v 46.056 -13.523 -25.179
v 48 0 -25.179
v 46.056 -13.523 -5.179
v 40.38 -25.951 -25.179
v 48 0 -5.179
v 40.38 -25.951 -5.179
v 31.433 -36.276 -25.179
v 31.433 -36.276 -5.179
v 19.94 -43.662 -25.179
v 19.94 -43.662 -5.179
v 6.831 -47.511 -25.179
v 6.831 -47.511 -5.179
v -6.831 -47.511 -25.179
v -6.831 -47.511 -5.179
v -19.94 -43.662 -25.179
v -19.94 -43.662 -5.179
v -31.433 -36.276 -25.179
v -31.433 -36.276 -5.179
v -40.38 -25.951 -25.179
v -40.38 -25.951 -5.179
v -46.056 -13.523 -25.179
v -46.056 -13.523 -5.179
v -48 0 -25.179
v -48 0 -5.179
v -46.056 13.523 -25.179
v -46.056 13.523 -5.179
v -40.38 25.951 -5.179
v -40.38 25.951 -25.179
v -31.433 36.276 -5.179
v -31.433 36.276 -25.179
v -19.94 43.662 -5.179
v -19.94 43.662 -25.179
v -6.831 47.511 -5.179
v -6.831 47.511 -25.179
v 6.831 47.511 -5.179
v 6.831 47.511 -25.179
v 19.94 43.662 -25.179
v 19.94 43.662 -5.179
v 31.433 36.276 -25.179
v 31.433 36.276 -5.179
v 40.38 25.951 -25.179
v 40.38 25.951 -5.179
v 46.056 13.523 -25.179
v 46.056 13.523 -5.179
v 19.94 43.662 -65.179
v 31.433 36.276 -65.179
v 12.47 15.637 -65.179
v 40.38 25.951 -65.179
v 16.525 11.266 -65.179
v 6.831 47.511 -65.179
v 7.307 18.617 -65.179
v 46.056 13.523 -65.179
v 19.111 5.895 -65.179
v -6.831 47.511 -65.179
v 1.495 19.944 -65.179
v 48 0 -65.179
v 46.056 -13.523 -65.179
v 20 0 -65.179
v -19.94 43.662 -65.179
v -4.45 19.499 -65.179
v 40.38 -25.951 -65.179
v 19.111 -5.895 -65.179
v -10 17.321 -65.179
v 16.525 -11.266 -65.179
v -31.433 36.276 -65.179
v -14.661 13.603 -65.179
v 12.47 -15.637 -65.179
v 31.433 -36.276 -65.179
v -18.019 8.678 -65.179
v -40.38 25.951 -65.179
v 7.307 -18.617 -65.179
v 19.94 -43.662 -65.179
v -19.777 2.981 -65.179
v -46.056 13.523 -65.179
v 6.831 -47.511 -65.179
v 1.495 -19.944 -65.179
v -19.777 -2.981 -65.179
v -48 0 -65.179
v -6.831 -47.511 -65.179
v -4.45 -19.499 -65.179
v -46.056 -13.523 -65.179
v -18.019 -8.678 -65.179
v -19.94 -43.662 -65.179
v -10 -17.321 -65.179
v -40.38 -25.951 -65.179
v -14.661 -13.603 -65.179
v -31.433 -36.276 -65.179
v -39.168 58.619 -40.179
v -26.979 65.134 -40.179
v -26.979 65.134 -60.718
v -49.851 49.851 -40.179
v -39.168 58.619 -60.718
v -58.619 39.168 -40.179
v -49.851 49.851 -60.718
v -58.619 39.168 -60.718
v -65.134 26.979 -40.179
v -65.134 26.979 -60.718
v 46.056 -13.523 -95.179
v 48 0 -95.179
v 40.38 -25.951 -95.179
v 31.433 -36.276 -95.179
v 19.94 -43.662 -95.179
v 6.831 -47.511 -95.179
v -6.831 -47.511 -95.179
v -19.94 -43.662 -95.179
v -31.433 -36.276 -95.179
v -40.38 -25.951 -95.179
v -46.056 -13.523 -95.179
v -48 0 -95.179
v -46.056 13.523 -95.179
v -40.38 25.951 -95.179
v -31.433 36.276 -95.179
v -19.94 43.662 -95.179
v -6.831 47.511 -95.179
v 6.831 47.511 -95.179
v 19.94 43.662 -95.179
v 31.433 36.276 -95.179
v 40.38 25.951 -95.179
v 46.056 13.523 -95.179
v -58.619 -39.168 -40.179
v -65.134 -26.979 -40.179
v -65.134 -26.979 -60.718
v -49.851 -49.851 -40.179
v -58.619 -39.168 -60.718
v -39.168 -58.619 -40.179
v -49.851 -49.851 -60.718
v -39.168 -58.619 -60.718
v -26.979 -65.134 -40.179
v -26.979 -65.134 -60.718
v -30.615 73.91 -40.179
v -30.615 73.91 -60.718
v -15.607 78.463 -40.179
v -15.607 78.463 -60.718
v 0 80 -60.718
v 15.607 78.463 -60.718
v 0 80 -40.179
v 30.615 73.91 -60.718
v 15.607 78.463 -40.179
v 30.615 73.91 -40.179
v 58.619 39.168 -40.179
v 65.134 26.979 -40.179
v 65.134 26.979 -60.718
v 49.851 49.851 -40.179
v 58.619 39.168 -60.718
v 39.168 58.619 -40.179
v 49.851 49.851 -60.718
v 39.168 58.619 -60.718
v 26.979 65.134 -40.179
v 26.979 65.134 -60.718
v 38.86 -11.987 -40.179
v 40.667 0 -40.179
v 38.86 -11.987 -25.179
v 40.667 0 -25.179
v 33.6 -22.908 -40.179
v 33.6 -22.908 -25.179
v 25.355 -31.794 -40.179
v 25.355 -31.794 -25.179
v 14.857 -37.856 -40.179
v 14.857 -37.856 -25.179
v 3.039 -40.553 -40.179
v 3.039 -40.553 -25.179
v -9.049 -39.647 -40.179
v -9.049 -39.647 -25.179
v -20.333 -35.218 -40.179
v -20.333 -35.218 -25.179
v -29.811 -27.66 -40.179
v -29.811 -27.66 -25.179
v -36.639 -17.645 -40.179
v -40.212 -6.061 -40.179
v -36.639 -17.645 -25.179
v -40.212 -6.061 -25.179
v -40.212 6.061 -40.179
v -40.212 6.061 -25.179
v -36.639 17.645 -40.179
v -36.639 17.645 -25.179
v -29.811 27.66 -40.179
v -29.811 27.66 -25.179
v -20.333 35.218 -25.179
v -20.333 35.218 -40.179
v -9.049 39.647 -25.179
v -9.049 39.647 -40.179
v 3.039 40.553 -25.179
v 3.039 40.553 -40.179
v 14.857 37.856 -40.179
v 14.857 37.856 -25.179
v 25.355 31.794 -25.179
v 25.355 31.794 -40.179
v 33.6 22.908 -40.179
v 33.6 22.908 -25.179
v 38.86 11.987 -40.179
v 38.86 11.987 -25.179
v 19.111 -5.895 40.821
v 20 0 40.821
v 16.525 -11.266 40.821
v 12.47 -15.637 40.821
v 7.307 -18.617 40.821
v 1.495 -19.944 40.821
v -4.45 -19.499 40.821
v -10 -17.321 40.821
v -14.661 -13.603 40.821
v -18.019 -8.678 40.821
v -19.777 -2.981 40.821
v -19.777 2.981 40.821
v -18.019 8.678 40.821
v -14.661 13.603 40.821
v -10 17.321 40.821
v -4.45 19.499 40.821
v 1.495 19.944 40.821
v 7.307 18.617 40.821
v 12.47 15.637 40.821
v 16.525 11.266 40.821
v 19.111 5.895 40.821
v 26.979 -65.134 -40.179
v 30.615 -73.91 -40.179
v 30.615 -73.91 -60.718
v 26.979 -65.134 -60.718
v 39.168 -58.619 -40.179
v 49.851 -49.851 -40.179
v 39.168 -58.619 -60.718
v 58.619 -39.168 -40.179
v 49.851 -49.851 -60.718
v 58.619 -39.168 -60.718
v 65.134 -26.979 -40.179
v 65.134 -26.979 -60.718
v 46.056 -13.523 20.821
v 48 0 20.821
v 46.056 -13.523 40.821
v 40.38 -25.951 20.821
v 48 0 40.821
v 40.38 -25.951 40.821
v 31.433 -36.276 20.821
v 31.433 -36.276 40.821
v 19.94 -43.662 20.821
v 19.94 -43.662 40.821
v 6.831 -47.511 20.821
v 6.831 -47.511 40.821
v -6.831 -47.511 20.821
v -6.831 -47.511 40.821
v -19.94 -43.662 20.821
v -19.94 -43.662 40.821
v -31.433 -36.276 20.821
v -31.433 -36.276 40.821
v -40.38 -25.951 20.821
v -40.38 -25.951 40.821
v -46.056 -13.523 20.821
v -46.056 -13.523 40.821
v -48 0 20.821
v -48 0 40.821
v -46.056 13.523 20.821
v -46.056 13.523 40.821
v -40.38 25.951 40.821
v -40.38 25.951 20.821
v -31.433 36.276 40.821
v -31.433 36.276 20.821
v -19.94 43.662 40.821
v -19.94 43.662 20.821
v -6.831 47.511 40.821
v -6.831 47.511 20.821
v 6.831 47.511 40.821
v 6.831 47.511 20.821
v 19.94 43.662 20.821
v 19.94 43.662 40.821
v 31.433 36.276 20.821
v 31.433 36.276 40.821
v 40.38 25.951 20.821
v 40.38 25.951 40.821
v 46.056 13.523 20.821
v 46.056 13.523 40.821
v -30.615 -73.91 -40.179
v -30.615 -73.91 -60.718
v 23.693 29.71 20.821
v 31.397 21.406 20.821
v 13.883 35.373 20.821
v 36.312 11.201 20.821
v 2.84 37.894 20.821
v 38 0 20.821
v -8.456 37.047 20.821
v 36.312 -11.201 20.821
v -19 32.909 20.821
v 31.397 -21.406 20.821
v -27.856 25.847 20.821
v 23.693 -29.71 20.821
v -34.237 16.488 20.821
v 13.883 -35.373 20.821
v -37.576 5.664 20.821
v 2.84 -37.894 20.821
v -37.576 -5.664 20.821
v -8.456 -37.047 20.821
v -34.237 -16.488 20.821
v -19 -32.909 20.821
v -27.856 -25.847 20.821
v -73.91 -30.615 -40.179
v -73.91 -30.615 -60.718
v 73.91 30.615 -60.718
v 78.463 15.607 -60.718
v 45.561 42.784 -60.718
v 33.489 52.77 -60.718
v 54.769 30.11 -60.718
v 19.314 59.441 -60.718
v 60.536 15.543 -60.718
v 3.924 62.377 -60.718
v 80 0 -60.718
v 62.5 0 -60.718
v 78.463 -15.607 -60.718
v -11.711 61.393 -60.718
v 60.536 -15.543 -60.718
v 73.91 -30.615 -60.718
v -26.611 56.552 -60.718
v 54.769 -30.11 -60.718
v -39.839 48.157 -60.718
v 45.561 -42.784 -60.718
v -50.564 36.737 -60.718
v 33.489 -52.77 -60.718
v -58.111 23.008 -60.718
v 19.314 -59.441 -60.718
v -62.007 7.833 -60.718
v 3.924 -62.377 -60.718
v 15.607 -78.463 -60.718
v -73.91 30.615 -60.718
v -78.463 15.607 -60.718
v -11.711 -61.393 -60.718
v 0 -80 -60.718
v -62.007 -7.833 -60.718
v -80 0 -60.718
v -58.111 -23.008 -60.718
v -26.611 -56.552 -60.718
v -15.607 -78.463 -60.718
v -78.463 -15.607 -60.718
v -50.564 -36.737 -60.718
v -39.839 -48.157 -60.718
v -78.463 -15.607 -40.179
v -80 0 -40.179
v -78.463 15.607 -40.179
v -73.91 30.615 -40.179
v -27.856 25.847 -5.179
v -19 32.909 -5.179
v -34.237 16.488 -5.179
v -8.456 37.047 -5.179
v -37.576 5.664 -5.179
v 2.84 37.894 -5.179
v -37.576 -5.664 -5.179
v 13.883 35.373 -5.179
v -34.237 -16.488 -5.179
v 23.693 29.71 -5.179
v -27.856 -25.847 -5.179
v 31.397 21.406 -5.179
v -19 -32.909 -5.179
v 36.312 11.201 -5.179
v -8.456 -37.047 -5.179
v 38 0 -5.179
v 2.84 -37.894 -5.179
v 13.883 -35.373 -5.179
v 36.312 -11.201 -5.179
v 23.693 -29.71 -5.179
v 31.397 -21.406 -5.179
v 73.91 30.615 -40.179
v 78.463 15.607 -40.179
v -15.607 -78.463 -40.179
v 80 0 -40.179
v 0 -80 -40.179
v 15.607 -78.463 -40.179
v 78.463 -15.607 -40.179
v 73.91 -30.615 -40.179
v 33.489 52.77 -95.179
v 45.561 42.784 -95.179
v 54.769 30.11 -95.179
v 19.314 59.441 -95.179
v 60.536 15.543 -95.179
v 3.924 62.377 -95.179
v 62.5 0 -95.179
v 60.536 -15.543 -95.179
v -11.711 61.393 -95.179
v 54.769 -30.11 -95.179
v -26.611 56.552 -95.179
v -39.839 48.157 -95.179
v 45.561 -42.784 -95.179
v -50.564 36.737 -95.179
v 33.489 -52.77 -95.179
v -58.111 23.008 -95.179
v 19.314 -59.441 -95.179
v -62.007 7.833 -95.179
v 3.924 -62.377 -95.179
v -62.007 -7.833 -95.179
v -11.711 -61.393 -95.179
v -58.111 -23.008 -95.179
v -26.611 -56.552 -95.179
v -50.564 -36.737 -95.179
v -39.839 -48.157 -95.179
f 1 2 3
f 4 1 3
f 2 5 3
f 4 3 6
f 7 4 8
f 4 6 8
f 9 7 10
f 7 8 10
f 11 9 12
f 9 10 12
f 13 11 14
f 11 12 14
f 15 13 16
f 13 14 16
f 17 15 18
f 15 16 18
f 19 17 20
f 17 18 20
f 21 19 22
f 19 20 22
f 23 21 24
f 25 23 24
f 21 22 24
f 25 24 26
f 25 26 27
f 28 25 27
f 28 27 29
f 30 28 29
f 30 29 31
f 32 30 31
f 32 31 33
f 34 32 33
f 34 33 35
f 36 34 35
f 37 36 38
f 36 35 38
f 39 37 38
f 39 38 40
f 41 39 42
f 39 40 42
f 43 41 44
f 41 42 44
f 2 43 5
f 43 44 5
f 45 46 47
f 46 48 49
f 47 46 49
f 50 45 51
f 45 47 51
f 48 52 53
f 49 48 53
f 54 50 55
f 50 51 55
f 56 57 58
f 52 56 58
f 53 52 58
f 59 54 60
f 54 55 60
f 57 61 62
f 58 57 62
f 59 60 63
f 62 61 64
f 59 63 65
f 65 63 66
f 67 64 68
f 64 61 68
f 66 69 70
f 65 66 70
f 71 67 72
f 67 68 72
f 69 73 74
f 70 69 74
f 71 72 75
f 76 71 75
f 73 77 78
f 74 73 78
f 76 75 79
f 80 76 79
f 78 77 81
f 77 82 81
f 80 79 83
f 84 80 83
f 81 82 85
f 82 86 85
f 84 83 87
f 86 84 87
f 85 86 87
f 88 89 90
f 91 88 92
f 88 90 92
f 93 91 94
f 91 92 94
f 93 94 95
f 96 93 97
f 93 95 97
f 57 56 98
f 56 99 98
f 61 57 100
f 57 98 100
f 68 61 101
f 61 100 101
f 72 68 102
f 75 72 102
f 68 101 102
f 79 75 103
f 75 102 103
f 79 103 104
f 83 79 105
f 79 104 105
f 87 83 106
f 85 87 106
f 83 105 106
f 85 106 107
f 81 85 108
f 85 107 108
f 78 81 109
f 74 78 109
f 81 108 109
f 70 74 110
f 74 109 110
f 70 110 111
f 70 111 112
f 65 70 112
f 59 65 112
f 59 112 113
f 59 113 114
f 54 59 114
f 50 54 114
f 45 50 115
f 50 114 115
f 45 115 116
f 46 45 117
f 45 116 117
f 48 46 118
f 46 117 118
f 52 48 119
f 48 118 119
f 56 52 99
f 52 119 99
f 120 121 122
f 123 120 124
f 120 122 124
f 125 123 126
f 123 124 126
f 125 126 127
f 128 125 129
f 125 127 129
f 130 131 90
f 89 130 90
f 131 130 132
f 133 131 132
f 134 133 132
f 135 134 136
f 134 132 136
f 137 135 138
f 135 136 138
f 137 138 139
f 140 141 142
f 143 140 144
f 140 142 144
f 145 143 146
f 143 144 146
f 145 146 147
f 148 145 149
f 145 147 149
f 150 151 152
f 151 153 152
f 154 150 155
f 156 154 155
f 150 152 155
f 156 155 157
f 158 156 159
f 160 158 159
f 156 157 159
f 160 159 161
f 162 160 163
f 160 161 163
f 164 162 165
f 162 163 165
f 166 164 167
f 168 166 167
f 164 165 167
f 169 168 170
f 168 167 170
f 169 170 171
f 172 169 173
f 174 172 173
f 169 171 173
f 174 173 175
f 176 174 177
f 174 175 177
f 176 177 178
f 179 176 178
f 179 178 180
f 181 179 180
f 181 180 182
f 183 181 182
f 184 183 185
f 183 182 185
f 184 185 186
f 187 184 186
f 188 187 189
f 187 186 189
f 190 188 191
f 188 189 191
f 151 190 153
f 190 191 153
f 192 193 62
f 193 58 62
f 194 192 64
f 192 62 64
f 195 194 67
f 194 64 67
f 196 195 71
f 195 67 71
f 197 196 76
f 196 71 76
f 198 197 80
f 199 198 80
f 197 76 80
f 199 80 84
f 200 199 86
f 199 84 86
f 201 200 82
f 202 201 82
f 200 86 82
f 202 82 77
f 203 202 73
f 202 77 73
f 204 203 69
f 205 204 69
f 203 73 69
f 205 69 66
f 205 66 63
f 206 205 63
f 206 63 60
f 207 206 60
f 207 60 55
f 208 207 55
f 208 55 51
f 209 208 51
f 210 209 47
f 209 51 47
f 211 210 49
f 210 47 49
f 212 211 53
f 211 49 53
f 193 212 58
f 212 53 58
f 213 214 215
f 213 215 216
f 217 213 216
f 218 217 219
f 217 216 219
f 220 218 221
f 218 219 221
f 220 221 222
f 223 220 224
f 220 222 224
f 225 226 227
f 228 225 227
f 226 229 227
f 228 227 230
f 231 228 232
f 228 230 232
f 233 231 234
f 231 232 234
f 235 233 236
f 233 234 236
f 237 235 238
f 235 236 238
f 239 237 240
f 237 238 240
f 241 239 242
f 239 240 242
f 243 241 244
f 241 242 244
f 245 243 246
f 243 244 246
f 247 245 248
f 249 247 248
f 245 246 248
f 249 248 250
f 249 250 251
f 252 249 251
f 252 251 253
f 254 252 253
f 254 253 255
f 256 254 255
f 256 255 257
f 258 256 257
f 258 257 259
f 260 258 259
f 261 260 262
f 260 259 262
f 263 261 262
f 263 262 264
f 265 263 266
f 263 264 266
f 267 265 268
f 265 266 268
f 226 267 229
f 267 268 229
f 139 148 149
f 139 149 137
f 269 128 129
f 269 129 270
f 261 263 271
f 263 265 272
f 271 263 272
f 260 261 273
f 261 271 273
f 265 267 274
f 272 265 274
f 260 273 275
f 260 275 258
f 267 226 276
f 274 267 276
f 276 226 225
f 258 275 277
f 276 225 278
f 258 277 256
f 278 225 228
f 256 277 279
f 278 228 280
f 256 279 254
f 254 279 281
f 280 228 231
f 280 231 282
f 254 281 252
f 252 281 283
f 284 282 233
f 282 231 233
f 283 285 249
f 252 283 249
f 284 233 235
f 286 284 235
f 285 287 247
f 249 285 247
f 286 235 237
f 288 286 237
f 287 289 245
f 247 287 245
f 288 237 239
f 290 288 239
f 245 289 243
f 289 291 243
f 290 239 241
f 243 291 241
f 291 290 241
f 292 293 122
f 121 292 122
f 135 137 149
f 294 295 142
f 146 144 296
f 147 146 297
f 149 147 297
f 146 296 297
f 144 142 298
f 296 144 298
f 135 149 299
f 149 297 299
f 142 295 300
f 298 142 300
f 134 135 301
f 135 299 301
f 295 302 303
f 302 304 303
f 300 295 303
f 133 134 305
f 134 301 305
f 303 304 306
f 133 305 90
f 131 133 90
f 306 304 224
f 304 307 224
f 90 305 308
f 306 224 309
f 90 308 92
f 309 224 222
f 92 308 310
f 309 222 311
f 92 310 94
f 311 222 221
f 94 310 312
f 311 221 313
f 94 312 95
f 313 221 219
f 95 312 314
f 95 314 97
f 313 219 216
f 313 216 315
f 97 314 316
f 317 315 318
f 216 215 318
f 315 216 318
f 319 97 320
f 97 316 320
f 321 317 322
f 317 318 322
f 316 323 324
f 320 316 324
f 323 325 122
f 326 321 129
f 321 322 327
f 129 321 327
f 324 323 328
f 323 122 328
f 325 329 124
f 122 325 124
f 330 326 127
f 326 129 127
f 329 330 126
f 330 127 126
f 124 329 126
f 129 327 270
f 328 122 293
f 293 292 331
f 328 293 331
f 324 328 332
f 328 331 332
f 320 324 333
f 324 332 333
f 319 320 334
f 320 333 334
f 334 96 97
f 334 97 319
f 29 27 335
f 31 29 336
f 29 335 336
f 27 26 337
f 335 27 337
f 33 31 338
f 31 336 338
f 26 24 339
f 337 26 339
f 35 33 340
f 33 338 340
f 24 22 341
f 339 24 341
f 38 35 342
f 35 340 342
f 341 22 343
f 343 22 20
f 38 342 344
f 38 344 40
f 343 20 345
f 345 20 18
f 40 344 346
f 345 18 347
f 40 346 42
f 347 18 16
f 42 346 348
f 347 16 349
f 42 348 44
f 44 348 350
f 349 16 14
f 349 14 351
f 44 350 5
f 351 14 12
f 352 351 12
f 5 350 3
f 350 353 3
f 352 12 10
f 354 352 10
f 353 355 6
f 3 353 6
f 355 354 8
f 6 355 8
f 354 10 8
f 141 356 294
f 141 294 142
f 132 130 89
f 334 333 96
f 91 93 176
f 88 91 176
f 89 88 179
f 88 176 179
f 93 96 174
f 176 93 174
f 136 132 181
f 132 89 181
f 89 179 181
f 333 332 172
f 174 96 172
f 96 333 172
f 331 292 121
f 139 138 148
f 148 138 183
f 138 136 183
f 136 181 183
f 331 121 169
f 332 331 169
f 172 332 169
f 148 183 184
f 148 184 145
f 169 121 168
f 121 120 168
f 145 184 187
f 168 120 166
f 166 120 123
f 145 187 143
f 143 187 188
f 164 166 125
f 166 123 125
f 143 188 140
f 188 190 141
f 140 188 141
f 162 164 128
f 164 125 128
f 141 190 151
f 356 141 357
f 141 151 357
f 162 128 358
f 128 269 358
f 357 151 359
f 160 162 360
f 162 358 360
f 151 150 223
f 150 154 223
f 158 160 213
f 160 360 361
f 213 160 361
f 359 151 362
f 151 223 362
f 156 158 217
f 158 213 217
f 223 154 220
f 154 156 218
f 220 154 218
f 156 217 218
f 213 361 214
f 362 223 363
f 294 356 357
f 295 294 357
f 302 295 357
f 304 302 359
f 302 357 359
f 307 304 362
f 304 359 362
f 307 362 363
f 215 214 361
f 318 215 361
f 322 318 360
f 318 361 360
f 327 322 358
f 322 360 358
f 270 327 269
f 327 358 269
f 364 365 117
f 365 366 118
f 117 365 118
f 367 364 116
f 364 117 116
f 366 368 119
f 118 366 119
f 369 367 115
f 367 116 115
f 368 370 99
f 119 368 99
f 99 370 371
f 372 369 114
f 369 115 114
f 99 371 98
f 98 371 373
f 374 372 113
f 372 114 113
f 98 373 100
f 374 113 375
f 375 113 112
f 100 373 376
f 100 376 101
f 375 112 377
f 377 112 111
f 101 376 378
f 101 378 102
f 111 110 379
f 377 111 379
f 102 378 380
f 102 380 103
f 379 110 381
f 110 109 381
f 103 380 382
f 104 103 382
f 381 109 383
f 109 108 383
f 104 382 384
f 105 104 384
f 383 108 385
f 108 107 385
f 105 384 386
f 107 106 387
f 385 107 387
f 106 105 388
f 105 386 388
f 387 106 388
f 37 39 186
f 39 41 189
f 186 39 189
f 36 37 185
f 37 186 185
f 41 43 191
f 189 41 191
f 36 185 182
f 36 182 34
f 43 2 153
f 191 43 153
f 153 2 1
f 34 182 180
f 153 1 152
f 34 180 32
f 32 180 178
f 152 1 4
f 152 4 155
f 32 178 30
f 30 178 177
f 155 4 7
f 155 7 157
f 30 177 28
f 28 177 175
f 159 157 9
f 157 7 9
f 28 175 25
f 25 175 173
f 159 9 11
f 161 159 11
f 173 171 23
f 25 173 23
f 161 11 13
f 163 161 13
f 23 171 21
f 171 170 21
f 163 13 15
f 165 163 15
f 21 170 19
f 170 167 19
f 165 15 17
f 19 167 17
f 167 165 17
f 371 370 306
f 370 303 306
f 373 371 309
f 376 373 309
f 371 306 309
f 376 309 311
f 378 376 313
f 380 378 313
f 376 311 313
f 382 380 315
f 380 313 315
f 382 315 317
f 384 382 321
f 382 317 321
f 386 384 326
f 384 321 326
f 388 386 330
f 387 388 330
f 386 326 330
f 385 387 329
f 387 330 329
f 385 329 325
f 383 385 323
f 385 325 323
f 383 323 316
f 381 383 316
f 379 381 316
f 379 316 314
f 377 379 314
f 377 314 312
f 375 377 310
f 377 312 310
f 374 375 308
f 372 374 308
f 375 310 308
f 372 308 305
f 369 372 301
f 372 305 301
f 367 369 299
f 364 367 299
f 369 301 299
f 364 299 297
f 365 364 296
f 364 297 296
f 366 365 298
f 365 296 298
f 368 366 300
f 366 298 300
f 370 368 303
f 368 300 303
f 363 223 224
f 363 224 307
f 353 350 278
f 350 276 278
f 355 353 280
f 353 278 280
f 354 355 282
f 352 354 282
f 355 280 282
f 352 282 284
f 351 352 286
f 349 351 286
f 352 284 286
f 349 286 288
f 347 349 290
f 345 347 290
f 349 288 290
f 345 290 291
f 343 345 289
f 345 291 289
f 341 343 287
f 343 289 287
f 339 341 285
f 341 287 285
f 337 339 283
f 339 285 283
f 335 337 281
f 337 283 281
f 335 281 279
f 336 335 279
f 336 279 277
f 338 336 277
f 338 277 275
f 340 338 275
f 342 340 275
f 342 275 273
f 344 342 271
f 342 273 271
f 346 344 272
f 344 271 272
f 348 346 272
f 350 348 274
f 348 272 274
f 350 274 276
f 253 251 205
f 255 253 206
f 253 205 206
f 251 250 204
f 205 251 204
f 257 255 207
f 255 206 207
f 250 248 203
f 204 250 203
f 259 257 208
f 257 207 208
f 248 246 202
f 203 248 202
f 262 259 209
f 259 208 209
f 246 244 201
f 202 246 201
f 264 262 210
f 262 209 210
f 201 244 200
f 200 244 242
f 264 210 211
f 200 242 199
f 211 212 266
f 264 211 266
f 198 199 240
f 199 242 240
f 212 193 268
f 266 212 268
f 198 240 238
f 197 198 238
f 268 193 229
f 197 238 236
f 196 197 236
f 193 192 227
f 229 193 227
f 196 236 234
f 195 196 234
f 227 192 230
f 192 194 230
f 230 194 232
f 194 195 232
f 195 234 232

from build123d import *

# Parameters (mm, degrees)
TAGLIO_ESTRUSIONE1_DEPTH    = 153.019930179
RIPETIZIONECIRCOLARE1_COUNT = 4


with BuildPart() as part:
    # Schizzo1 → Rivoluzione1 (revolve)
    with BuildSketch(Plane(origin=(0, 0, 0), x_dir=(0, 0, -1), z_dir=(1, 0, 0)), mode=Mode.PRIVATE) as rivoluzione1_sk:
        Polygon((-40.820512821, 20), (65.179487179, 20), (65.179487179, 48), (95.179487179, 48), (95.179487179, 62.5), (60.717948718, 62.5), (60.717948718, 80), (40.179487179, 80), (40.179487179, 40.666666667), (25.179487179, 40.666666667), (25.179487179, 48), (5.179487179, 48), (5.179487179, 38), (-20.820512821, 38), (-20.820512821, 48), (-40.820512821, 48), align=None)
    revolve(rivoluzione1_sk.sketch.rotate(Axis((0, 0, 49.025641026), (0, 0, -1)), 90), axis=Axis((0, 0, 49.025641026), (0, 0, -1)))

    # Schizzo2 → Taglio-Estrusione1 (cut, through all)
    with BuildSketch(Plane(origin=(0, 0, -60.717948718), x_dir=(-1, 0, 0), z_dir=(0, 0, -1))):
        with BuildLine():
            ThreePointArc((26.979181982, 65.133507042), (49.851028074, 49.851028074), (65.133507042, 26.979181982))
            Line((65.133507042, 26.979181982), (73.910362601, 30.614674589))
            ThreePointArc((73.910362601, 30.614674589), (56.568542495, 56.568542495), (30.614674589, 73.910362601))
            Line((30.614674589, 73.910362601), (26.979181982, 65.133507042))
        make_face()
    taglio_estrusione1 = extrude(amount=-TAGLIO_ESTRUSIONE1_DEPTH, mode=Mode.SUBTRACT)

    # RipetizioneCircolare1: Taglio-Estrusione1 ×4 about axis
    ripetizionecircolare1_axis = Axis((0, 0, 49.025641026), (0, 0, 1))
    for i in range(1, RIPETIZIONECIRCOLARE1_COUNT):
        add(taglio_estrusione1.rotate(ripetizionecircolare1_axis, i * 360 / RIPETIZIONECIRCOLARE1_COUNT), mode=Mode.SUBTRACT)


solid = part.part
